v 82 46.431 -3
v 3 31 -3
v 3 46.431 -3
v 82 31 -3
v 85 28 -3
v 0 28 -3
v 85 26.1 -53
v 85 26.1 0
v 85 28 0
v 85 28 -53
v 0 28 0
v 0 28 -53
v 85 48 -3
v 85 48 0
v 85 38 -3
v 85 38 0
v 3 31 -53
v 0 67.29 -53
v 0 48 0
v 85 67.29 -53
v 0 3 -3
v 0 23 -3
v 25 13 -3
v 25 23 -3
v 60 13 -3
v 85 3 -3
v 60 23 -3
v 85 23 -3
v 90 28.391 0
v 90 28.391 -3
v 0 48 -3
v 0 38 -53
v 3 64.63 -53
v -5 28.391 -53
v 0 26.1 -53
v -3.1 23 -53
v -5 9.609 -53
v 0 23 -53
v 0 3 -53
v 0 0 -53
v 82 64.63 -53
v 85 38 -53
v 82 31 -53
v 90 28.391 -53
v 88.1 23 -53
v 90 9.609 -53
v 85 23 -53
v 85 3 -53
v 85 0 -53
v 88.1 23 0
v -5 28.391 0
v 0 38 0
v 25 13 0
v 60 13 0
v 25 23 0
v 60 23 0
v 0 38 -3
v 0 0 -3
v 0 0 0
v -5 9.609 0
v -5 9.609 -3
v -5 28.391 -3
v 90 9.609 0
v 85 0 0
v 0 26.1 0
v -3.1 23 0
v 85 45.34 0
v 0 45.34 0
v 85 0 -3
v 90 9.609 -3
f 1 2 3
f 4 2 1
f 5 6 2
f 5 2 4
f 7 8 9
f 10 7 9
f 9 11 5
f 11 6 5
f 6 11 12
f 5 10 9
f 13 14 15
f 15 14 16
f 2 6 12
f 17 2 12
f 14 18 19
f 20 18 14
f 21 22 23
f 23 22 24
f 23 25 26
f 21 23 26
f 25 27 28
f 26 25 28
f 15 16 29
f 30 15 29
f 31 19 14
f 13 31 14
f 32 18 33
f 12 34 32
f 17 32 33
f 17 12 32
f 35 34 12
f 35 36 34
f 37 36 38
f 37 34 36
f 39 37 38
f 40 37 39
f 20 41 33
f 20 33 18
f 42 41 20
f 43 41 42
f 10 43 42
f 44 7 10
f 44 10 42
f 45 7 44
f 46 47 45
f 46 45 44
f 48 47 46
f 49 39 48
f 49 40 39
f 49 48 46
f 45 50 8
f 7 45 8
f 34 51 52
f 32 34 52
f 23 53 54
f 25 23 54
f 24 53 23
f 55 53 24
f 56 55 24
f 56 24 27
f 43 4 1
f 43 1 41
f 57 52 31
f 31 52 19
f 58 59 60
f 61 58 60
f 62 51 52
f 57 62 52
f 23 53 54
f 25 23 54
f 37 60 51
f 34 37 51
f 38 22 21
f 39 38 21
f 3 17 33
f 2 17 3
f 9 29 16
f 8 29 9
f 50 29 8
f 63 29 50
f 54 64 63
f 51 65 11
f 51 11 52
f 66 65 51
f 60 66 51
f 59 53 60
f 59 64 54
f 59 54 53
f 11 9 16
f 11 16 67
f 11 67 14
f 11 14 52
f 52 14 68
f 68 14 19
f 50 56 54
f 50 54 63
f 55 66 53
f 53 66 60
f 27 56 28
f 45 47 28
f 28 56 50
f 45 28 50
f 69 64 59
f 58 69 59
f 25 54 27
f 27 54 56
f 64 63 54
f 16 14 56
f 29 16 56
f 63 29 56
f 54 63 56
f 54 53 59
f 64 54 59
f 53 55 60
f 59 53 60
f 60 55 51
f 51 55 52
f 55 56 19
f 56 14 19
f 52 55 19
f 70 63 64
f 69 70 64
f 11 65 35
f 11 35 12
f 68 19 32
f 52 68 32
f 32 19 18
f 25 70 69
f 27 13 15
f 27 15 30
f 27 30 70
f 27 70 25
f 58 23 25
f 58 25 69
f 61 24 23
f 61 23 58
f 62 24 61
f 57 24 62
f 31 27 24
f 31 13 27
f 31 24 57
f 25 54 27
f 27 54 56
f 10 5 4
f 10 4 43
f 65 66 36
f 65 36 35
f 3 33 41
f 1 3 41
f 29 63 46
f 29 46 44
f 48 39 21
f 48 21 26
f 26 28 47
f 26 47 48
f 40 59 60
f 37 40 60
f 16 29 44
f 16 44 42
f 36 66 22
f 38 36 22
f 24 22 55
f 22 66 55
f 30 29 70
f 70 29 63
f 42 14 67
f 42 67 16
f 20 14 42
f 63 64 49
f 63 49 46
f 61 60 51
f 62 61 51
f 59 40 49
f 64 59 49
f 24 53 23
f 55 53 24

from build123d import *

# Parameters (mm, degrees)
SKETCH1_W                      = 85
SKETCH1_H                      = 93
BOSS_EXTRUDE1_BASE_DEPTH       = 3
BOSS_EXTRUDE4_SIDE_WALLS_DEPTH = 93
CUT_EXTRUDE2_START             = 3
CUT_EXTRUDE2_GUIDE_HOLES_DEPTH = 138.881429411
SKETCH15_W                     = 85
SKETCH15_H                     = 20
BOSS_EXTRUDE9_REAR_WALL_DEPTH  = 3
BOSS_EXTRUDE1_START            = 3
SKETCH17_W                     = 85
SKETCH17_H                     = 3
BOSS_EXTRUDE1_REAR_WALL_DEPTH  = 12
SKETCH30_W                     = 85
SKETCH30_H                     = 2
CUT_EXTRUDE1_REAR_WALL_DEPTH   = 10
BOSS_EXTRUDE2_START            = 25
SKETCH20_W                     = 3
SKETCH20_H                     = 90
BOSS_EXTRUDE2_SIDE_WALL_DEPTH  = 10
CHAMFER1_SIDE_WALL_SIZE        = 3
BOSS_EXTRUDE5_SIDE_WALL_DEPTH  = 50
CHAMFER2_ROOF_SIZE             = 40
CHAMFER2_ROOF_SIZE_2           = 109.899096778
SKETCH28_W                     = 85
SKETCH28_H                     = 102.388734274
BOSS_EXTRUDE7_ROOF_DEPTH       = 2.5
SKETCH29_W                     = 5.082998623
SKETCH29_H                     = 88.705427338
SKETCH29_W_2                   = 8.288926101
SKETCH29_H_2                   = 87.454678394
CUT_EXTRUDE1_CLEAN_UP_DEPTH    = 157.630352173
SKETCH31_W                     = 95
SKETCH31_H                     = 40
CUT_EXTRUDE2_CLEAN_UP_DEPTH    = 154.128366882
BOSS_EXTRUDE1_DEPTH            = 3
SKETCH34_W                     = 35
SKETCH34_H                     = 10
CUT_EXTRUDE1_DEPTH             = 10


# Some blends are built 0.0001 mm under size
with BuildPart() as part:
    # Sketch1 → Boss-Extrude1 _Base (new body)
    with BuildSketch(Plane(origin=(0, 0, 0), x_dir=(1, 0, 0), z_dir=(0, 1, 0))):
        with Locations((42.5, 46.5)):
            Rectangle(SKETCH1_W, SKETCH1_H)
    extrude(amount=BOSS_EXTRUDE1_BASE_DEPTH)

    # Sketch5 → Boss-Extrude4 _Side Walls (add, through all)
    with BuildSketch(Plane.XY):
        Polygon((-5, 28.390936655), (0, 38), (0, 0), (-5, 9.609063345), align=None)
        Polygon((90, 9.609063345), (90, 28.390936655), (85, 38), (85, 0), align=None)
    extrude(amount=-BOSS_EXTRUDE4_SIDE_WALLS_DEPTH)

    # Sketch4 → Cut-Extrude2 _Guide Holes (cut, through all)
    with BuildSketch(Plane.XY.offset(CUT_EXTRUDE2_START)):
        Polygon((-3.1, 23), (0, 26.1), (0, 23), align=None)
        Polygon((85, 23), (88.1, 23), (85, 26.1), align=None)
    extrude(amount=-CUT_EXTRUDE2_GUIDE_HOLES_DEPTH, mode=Mode.SUBTRACT)

    # Sketch15 → Boss-Extrude9 _Rear Wall (add)
    with BuildSketch(Plane.XY):
        with Locations((42.5, 13)):
            Rectangle(SKETCH15_W, SKETCH15_H)
    extrude(amount=-BOSS_EXTRUDE9_REAR_WALL_DEPTH)

    # Sketch17 → Boss-Extrude1 _Rear Wall (add)
    with BuildSketch(Plane(origin=(0, 23, 0), x_dir=(1, 0, 0), z_dir=(0, 1, 0)).offset(BOSS_EXTRUDE1_START)):
        with Locations((42.5, 1.5)):
            Rectangle(SKETCH17_W, SKETCH17_H)
    extrude(amount=BOSS_EXTRUDE1_REAR_WALL_DEPTH)

    # Sketch30 → Cut-Extrude1 _Rear Wall (cut)
    with BuildSketch(Plane.XY):
        with Locations((42.5, 27)):
            Rectangle(SKETCH30_W, SKETCH30_H)
    extrude(amount=-CUT_EXTRUDE1_REAR_WALL_DEPTH, mode=Mode.SUBTRACT)

    # Sketch20 → Boss-Extrude2 _Side Wall (add)
    with BuildSketch(Plane(origin=(0, 3, 0), x_dir=(1, 0, 0), z_dir=(0, 1, 0)).offset(BOSS_EXTRUDE2_START)):
        with Locations((1.5, 48)):
            Rectangle(SKETCH20_W, SKETCH20_H)
        with Locations((83.5, 48)):
            Rectangle(SKETCH20_W, SKETCH20_H)
    extrude(amount=BOSS_EXTRUDE2_SIDE_WALL_DEPTH)

    # Chamfer1 _Side Wall
    chamfer1_side_wall_edges = [part.edges().sort_by_distance(p)[0] for p in [
        (82, 28, -48),
        (3, 28, -48),
    ]]
    chamfer(chamfer1_side_wall_edges, length=CHAMFER1_SIDE_WALL_SIZE - 0.0001)  # a hair under: the kernel refuses the full size

    # Sketch26 → Boss-Extrude5 _Side Wall (add)
    with BuildSketch(Plane(origin=(0, 38, 0), x_dir=(1, 0, 0), z_dir=(0, 1, 0))):
        Polygon((0, 0), (0, 93), (3, 93), (3, 3), (82, 3), (82, 93), (85, 93), (85, 0), align=None)
    extrude(amount=BOSS_EXTRUDE5_SIDE_WALL_DEPTH)

    # Chamfer2 _Roof
    # the kernel refuses this chamfer: 109.899096778, 40 mm, written as the material it takes off along each edge
    with BuildSketch(Plane(origin=(370.099657974, 88, 0), x_dir=(0, -0.9950833631817486, 0.09904090225205059), z_dir=(-1, 0, 0))) as chamfer2_roof_piece_1:
        Polygon((CHAMFER2_ROOF_SIZE * 0.995083363182, -CHAMFER2_ROOF_SIZE * 0.0990409022521), (-CHAMFER2_ROOF_SIZE_2 * 0.0990409022522, -CHAMFER2_ROOF_SIZE_2 * 0.995083363183), (0, 0), align=None)
    extrude(amount=655.199315948, mode=Mode.SUBTRACT)

    # Sketch28 → Boss-Extrude7 _Roof (add)
    with BuildSketch(Plane(origin=(0, 42.385066635, 15.426902632), x_dir=(1, 0, 0), z_dir=(0, 0.9396926207859096, 0.34202014332566505))):
        with Locations((42.5, 64.191132583)):
            Rectangle(SKETCH28_W, SKETCH28_H)
    extrude(amount=-BOSS_EXTRUDE7_ROOF_DEPTH)

    # Sketch29 → Cut-Extrude1 _Clean up (cut, through all)
    with BuildSketch(Plane(origin=(90, 0, 0), x_dir=(0, 0, -1), z_dir=(1, 0, 0))):
        with Locations((95.541499312, 44.352713669)):
            Rectangle(SKETCH29_W, SKETCH29_H)
        with Locations((-4.144463051, 43.727339197)):
            Rectangle(SKETCH29_W_2, SKETCH29_H_2)
    extrude(amount=-CUT_EXTRUDE1_CLEAN_UP_DEPTH, mode=Mode.SUBTRACT)

    # Sketch31 → Cut-Extrude2 _Clean Up (cut, through all)
    with BuildSketch(Plane.XZ):
        with Locations((42.5, -73)):
            Rectangle(SKETCH31_W, SKETCH31_H)
    extrude(amount=-CUT_EXTRUDE2_CLEAN_UP_DEPTH, mode=Mode.SUBTRACT)


with BuildPart() as body_2:
    # Sketch33 → Boss-Extrude1 (new body)
    with BuildSketch(Plane.XY):
        Polygon((0, 38), (0, 48), (85, 48), (85, 38), (90, 28.390936655), (90, 9.609063345), (85, 0), (0, 0), (-5, 9.609063345), (-5, 28.390936655), align=None)
    extrude(amount=-BOSS_EXTRUDE1_DEPTH)


with BuildPart() as cut_extrude1_tool:
    # Sketch34 → Cut-Extrude1 (new body)
    with BuildSketch(Plane.XY):
        with Locations((42.5, 18)):
            Rectangle(SKETCH34_W, SKETCH34_H)
    extrude(amount=-CUT_EXTRUDE1_DEPTH)


with BuildPart() as part_1:
    add(part.part)

    # Cut-Extrude1: cut by cut_extrude1_tool
    add(cut_extrude1_tool.part, mode=Mode.SUBTRACT)


with BuildPart() as body_2_1:
    add(body_2.part)

    # Cut-Extrude1: cut by cut_extrude1_tool
    add(cut_extrude1_tool.part, mode=Mode.SUBTRACT)


solid = Compound([part_1.part, body_2_1.part])
